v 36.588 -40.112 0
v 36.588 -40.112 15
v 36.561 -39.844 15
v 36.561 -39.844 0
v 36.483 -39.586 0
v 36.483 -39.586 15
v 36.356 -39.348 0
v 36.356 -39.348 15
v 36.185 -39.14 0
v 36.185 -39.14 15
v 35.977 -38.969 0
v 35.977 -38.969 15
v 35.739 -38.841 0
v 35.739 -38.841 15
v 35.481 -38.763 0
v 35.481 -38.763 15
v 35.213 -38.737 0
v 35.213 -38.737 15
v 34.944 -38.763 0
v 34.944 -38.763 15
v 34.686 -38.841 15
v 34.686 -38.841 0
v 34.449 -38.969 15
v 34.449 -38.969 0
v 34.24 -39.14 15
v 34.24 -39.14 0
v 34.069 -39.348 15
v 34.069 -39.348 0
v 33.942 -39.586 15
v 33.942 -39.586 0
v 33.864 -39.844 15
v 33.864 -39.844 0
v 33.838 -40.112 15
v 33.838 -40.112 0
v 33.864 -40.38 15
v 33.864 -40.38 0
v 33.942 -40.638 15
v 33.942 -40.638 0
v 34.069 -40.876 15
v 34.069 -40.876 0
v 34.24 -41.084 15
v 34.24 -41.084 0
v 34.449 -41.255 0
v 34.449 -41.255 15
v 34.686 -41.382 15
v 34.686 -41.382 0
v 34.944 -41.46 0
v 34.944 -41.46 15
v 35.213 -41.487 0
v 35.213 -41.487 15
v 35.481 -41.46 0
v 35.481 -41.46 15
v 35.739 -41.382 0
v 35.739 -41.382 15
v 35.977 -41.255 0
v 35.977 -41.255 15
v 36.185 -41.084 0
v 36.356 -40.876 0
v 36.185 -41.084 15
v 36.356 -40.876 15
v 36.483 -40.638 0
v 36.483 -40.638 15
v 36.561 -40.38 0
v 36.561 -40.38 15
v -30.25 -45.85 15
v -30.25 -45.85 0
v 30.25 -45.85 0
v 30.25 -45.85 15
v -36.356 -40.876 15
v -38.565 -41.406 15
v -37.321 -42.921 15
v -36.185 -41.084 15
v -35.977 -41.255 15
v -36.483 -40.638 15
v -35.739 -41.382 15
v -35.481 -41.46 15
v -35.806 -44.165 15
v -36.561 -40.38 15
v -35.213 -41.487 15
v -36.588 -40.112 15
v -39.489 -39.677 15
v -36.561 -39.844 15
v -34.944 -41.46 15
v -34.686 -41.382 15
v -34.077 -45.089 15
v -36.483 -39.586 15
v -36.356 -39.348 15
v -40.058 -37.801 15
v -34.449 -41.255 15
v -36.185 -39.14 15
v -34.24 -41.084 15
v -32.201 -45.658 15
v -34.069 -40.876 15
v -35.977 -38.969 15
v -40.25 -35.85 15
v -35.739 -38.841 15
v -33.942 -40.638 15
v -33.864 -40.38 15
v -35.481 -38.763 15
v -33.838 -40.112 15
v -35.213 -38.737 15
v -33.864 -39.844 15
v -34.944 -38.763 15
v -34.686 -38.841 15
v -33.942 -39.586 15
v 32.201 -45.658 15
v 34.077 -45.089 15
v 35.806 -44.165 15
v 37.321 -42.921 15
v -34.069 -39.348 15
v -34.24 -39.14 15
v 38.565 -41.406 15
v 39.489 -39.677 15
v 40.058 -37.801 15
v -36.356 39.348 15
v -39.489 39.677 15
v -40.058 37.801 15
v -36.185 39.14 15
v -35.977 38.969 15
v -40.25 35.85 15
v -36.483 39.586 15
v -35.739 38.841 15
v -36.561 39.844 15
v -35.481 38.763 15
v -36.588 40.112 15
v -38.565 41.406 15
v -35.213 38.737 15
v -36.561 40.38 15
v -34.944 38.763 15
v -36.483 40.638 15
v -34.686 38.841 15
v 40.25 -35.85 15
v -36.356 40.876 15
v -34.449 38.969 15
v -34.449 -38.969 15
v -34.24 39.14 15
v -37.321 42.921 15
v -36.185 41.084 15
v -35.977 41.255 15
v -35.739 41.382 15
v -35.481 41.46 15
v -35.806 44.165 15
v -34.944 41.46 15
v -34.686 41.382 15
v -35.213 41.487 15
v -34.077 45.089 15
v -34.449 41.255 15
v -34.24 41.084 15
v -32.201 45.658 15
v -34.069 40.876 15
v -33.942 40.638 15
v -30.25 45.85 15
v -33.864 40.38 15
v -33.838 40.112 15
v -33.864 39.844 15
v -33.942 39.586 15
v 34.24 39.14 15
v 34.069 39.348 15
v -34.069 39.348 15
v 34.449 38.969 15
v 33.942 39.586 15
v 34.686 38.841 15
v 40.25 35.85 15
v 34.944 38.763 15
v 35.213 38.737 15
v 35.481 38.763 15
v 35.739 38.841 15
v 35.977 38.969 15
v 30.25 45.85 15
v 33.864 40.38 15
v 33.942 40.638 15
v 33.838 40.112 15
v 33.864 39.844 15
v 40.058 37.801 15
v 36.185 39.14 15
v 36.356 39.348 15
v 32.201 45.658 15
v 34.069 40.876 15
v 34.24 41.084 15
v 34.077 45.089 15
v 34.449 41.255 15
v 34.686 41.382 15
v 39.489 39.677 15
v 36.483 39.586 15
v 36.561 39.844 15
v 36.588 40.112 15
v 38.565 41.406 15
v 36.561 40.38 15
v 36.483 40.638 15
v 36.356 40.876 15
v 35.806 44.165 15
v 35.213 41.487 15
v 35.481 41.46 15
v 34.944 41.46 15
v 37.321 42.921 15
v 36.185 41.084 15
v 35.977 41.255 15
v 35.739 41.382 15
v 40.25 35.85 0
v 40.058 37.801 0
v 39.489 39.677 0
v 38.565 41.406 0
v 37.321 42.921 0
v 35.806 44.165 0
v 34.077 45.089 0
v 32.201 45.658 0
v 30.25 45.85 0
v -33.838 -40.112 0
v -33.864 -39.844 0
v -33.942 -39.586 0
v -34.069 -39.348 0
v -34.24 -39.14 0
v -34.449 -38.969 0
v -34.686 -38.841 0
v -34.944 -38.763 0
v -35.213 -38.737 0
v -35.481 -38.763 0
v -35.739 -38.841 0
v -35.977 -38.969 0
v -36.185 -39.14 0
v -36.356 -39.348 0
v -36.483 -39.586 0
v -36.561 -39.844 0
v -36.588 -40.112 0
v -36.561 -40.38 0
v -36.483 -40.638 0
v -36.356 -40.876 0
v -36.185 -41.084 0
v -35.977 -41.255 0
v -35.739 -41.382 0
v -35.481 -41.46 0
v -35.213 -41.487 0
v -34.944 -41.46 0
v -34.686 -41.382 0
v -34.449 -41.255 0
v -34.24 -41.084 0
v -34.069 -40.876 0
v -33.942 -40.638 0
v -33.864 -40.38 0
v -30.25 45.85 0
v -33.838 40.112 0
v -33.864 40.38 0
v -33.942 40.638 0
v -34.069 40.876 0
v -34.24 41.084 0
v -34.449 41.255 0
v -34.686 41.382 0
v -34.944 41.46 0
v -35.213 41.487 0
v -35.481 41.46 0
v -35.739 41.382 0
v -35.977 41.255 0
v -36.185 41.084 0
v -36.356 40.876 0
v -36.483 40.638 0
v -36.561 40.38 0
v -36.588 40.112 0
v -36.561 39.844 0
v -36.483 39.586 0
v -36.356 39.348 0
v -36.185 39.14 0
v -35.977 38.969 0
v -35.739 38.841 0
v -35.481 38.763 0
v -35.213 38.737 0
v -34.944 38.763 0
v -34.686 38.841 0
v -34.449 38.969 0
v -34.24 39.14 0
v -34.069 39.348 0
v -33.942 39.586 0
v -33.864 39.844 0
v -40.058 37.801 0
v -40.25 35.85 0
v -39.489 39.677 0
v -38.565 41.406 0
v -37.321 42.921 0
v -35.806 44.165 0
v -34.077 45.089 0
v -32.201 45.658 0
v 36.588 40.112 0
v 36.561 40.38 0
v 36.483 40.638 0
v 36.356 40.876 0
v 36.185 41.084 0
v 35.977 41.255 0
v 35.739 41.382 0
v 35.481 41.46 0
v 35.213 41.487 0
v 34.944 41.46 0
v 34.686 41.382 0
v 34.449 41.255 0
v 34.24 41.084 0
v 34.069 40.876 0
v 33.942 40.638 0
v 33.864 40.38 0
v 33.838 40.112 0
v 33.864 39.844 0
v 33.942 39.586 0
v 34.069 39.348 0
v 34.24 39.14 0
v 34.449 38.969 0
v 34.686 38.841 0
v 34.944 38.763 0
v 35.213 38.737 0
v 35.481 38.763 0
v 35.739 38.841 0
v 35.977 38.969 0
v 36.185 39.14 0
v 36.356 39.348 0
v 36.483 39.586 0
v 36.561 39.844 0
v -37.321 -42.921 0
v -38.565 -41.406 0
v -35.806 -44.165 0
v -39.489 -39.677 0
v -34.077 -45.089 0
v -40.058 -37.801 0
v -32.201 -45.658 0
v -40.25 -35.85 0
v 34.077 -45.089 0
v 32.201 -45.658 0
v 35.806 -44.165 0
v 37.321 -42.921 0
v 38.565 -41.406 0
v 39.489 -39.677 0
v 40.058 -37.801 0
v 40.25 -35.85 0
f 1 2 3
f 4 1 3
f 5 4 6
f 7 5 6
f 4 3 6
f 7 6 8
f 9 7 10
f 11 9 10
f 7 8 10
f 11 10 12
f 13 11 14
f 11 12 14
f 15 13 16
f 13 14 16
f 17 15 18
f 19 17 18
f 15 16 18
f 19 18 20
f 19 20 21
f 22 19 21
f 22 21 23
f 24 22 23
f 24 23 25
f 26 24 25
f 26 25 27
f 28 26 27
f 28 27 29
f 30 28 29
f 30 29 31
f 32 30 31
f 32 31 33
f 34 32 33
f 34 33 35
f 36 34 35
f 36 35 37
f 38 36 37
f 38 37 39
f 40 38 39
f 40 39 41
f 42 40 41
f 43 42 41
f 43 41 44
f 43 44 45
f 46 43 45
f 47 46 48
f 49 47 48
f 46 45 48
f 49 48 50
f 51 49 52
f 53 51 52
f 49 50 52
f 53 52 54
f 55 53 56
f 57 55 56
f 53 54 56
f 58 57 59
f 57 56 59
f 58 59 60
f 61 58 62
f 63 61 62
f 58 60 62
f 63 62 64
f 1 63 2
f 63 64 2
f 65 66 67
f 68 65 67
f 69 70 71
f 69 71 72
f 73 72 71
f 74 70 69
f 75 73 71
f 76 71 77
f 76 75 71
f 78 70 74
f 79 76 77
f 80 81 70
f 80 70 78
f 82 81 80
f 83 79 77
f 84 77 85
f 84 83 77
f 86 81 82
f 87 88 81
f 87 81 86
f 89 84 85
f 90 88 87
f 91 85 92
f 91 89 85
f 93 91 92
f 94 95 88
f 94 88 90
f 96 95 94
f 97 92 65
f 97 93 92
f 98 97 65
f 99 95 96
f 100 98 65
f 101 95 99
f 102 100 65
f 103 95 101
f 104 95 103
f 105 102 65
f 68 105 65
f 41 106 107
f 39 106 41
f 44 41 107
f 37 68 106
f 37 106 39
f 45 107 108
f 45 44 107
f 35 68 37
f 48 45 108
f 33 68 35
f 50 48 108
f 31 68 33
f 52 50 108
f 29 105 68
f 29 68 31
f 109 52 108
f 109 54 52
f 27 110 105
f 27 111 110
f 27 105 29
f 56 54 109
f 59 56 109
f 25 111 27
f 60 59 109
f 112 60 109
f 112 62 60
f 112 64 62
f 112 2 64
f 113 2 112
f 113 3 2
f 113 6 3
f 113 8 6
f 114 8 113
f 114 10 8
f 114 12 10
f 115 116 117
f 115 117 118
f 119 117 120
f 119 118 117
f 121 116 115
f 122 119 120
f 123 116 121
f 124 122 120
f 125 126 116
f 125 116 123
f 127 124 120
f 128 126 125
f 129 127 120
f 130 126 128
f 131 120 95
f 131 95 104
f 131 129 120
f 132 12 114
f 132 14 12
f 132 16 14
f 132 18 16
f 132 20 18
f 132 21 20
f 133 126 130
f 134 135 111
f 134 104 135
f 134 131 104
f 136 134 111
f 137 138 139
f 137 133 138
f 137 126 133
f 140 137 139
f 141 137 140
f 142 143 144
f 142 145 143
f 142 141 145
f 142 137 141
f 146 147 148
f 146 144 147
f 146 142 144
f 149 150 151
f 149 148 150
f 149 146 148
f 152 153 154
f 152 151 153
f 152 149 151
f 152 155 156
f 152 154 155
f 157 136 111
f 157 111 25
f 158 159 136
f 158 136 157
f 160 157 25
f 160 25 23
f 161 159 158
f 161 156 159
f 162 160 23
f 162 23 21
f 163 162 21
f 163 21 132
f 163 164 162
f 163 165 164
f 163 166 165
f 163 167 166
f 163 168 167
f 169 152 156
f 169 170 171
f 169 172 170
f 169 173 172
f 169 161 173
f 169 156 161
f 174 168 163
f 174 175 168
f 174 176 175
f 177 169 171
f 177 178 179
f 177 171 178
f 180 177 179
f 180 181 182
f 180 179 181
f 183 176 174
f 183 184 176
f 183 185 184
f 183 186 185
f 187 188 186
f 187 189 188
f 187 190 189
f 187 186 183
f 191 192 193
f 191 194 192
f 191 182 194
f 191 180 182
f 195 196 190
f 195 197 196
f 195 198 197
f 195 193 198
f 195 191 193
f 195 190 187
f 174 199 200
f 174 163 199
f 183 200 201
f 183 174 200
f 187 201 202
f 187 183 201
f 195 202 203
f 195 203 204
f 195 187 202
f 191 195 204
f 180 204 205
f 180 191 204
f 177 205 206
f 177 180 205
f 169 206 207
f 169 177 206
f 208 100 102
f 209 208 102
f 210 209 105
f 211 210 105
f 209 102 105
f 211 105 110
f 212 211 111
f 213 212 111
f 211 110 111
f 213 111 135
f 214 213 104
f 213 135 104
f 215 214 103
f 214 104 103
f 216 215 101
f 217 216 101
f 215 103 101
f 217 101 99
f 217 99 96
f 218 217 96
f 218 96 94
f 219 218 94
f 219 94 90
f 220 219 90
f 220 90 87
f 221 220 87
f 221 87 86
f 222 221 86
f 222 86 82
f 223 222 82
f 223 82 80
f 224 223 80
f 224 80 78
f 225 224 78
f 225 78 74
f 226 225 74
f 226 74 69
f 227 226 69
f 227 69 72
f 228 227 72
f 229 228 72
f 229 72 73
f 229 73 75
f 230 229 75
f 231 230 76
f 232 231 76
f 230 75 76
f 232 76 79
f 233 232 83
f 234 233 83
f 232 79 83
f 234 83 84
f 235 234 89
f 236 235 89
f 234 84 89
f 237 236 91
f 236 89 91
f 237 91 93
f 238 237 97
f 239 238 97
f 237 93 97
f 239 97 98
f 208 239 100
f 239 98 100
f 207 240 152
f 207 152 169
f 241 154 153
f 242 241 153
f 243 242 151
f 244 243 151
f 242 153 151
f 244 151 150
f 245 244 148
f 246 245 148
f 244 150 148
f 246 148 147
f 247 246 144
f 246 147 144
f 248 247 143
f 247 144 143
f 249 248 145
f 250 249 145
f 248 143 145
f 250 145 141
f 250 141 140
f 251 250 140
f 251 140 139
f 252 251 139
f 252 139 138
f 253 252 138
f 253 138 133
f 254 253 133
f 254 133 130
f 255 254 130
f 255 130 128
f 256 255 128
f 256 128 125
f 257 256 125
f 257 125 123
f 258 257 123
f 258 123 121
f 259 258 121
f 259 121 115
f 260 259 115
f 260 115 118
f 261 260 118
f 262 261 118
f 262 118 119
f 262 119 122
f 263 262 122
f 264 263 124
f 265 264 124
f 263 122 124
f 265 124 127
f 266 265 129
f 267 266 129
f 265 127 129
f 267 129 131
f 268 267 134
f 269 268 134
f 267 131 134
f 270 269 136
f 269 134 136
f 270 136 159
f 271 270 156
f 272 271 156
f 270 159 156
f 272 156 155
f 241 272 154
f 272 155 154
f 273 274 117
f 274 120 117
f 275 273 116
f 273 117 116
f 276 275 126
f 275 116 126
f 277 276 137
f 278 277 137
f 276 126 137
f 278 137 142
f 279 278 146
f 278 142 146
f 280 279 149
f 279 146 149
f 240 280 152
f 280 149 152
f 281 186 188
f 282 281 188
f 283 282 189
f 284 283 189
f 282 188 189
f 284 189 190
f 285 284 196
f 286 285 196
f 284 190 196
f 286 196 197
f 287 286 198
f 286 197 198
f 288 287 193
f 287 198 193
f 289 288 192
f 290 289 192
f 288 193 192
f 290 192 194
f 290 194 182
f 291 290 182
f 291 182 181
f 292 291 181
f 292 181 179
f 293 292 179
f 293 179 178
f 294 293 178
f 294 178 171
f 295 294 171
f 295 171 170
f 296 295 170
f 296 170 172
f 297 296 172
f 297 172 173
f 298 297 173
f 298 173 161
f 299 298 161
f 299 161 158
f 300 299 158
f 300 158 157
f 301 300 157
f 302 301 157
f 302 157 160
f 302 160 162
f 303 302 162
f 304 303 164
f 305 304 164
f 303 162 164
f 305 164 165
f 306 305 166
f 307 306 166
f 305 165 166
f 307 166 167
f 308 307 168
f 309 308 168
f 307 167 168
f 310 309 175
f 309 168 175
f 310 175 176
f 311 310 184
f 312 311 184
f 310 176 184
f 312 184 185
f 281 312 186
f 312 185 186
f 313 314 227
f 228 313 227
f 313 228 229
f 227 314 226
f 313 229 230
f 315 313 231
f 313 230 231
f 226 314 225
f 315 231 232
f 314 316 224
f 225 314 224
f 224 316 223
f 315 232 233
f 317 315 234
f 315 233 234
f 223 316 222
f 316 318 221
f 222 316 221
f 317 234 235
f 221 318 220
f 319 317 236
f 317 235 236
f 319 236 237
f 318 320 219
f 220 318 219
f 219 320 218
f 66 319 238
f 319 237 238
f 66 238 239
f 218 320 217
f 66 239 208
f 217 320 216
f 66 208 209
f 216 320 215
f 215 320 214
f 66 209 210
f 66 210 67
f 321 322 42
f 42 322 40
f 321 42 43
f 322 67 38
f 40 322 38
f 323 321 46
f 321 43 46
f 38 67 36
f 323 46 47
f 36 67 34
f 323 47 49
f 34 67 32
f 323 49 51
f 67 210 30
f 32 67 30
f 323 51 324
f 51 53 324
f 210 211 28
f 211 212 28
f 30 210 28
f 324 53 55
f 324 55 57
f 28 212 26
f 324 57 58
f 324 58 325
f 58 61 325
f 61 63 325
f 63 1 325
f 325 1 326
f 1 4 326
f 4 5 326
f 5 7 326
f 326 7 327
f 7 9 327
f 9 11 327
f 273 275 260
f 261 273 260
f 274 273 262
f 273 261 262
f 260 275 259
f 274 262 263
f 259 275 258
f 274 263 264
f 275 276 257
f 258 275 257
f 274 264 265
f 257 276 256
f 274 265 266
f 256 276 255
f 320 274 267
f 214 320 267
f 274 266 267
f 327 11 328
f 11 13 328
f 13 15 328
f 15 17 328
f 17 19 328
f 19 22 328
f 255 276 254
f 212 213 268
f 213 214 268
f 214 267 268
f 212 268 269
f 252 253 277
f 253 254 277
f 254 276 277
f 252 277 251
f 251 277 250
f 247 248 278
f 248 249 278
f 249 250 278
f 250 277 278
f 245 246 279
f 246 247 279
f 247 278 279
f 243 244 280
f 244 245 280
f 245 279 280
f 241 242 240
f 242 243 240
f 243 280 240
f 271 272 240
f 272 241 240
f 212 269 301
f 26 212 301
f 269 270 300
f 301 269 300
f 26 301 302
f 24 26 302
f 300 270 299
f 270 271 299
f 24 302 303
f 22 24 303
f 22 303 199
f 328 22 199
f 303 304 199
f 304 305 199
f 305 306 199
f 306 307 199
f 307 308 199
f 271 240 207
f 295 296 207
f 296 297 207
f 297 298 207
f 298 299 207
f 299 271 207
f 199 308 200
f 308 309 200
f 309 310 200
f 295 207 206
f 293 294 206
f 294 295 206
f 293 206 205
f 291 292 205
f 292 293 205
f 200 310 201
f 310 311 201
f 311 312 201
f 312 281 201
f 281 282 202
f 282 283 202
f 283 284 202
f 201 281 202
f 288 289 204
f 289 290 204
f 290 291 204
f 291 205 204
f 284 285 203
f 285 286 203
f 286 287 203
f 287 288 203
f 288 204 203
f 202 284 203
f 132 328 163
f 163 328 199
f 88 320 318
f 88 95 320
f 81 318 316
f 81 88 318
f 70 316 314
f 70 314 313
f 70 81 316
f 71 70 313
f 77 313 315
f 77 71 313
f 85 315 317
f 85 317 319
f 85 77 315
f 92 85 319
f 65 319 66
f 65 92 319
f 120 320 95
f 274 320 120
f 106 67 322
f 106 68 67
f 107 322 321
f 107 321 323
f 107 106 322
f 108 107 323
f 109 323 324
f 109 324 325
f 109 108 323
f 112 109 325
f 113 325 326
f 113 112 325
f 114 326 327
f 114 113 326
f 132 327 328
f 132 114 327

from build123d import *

# Parameters (mm, degrees)
SKIZZE1_W                       = 80.5
SKIZZE1_H                       = 91.7
AUFSATZ_LINEAR_AUSTRAGEN1_DEPTH = 15
VERRUNDUNG1_R                   = 10
SKIZZE2_R                       = 1.375
SCHNITT_LINEAR_AUSTRAGEN1_DEPTH = 63.827422357


with BuildPart() as part:
    # Skizze1 → Aufsatz-Linear austragen1 (new body)
    with BuildSketch(Plane.XY):
        Rectangle(SKIZZE1_W, SKIZZE1_H)
    extrude(amount=AUFSATZ_LINEAR_AUSTRAGEN1_DEPTH)

    # Verrundung1
    verrundung1_edges = [part.edges().sort_by_distance(p)[0] for p in [
        (40.25, -45.85, 7.5),
        (-40.25, -45.85, 7.5),
        (-40.25, 45.85, 7.5),
        (40.25, 45.85, 7.5),
    ]]
    fillet(verrundung1_edges, radius=VERRUNDUNG1_R)

    # Skizze2 → Schnitt-Linear austragen1 (cut, through all)
    with BuildSketch(Plane.XY.offset(15)):
        with Locations((-35.212670401, 40.111824544)):
            Circle(SKIZZE2_R)
        with Locations((35.212670401, 40.111824544)):
            Circle(SKIZZE2_R)
        with Locations((35.212670401, -40.111824544)):
            Circle(SKIZZE2_R)
        with Locations((-35.212670401, -40.111824544)):
            Circle(SKIZZE2_R)
    extrude(amount=-SCHNITT_LINEAR_AUSTRAGEN1_DEPTH, mode=Mode.SUBTRACT)


solid = part.part
